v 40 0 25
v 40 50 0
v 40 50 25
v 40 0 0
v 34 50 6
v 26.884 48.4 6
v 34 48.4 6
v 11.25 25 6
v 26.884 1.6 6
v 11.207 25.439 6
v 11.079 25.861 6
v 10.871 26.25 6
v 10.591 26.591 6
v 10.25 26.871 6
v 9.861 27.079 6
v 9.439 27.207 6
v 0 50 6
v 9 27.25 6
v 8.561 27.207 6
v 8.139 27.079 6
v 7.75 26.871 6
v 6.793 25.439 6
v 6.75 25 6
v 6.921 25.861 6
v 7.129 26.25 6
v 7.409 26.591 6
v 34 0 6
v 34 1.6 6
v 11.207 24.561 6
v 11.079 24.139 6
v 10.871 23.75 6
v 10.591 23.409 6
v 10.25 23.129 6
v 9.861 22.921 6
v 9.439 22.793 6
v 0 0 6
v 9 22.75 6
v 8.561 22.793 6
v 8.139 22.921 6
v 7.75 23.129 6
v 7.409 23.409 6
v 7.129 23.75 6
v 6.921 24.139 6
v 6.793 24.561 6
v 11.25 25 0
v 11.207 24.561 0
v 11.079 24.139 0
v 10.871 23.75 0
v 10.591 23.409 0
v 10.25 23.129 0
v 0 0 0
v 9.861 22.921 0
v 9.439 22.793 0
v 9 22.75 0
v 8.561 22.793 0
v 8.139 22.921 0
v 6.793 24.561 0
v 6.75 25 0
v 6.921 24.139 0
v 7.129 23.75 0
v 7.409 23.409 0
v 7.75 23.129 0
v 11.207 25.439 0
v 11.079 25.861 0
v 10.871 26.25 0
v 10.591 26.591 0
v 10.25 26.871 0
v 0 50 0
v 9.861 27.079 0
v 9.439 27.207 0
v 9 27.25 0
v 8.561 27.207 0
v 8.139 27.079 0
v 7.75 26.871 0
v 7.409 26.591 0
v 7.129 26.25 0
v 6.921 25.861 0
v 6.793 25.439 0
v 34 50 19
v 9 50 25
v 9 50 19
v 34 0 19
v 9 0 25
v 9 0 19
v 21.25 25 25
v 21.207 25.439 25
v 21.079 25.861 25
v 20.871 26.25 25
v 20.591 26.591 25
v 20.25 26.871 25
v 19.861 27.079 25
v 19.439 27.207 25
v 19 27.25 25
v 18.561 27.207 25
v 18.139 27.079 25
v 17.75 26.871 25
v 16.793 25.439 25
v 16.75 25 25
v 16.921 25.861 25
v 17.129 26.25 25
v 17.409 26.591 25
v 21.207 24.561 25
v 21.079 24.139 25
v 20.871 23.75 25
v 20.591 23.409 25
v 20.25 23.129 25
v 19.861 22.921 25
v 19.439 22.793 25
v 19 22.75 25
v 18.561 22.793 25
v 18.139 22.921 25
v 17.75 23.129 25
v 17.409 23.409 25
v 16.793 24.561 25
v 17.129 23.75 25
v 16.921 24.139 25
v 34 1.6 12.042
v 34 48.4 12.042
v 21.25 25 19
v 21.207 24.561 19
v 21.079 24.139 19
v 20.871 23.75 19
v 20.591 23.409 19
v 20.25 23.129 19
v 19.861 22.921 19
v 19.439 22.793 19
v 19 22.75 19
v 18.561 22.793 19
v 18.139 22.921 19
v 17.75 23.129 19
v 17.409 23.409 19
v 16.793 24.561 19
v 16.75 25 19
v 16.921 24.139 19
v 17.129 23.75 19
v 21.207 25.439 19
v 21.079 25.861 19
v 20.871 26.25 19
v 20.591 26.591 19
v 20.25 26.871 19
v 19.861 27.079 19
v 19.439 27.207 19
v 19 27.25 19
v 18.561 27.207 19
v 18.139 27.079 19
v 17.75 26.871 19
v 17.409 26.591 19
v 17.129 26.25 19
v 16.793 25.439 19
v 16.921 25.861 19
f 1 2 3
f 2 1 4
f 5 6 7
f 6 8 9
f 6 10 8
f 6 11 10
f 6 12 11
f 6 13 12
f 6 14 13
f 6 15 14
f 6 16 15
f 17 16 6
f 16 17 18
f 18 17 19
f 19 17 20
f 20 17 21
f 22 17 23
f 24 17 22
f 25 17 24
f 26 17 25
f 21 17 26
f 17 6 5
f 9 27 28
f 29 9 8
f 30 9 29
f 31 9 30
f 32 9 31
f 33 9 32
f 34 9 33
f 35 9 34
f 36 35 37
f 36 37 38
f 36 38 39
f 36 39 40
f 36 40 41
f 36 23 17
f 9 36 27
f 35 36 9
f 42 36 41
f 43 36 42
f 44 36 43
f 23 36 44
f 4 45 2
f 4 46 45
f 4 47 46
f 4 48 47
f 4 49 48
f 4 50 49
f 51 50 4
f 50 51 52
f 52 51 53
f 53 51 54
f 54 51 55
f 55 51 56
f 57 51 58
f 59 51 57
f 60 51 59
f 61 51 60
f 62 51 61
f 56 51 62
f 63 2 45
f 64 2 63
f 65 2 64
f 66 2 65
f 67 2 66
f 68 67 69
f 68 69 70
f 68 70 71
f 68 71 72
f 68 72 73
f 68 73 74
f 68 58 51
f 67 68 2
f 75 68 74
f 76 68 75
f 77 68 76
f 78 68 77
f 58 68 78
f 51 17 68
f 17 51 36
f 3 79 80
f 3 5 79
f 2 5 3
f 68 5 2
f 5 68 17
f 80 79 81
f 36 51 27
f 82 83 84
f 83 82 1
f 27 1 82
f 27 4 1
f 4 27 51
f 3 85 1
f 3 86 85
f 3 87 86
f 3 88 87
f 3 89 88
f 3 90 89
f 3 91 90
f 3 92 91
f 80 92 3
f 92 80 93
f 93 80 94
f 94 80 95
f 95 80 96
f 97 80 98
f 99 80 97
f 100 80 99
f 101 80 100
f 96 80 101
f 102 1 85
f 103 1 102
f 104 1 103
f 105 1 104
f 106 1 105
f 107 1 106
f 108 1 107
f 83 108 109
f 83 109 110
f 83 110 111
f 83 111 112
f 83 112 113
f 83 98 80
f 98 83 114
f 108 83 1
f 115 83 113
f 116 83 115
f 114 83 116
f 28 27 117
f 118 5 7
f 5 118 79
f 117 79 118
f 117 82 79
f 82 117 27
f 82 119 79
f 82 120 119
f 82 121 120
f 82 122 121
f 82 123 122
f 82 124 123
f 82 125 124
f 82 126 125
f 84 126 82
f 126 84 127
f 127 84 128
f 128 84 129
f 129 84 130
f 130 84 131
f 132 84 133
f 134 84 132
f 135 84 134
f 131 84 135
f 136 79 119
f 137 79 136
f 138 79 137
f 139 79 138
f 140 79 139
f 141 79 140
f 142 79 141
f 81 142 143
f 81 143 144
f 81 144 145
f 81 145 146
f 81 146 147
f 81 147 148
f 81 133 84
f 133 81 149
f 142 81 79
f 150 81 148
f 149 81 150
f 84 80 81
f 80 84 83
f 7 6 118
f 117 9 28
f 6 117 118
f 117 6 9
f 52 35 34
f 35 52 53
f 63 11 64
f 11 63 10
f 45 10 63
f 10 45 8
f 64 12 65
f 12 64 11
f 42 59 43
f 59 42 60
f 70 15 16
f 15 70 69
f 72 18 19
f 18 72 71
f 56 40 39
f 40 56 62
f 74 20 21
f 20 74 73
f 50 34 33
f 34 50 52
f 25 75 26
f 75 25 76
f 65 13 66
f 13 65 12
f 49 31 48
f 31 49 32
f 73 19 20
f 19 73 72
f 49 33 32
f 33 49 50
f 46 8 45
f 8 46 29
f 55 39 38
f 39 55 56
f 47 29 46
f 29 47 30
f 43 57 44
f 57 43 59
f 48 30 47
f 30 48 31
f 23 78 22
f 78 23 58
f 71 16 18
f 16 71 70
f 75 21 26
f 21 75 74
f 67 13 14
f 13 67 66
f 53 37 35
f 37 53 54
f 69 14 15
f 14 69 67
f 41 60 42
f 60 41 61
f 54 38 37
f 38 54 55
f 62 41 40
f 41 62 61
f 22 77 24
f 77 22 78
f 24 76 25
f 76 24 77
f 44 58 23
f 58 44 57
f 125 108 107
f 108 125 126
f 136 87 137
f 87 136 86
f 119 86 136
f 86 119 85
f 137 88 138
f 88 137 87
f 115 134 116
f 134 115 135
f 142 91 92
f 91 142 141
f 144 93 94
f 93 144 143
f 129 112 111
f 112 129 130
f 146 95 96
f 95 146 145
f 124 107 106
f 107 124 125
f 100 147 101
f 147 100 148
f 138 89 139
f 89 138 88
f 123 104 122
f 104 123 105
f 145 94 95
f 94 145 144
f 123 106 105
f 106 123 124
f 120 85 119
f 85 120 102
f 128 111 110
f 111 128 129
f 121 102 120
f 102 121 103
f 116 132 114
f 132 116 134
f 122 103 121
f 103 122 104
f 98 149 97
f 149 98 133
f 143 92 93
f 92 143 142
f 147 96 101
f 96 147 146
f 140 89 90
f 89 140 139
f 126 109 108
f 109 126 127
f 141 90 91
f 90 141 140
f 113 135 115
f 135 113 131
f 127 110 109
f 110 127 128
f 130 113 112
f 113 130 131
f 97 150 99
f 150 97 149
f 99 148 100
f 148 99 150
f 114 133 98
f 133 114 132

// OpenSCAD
$fn = 32;

// ----------------------------------------------------------------------
// Z-bracket: 40 x 50 x 25 mm
// ----------------------------------------------------------------------

// --- parameters (mm) ---
bottom_run = 40;          // lower foot length, X
top_run = 25;             // upper foot length, X
profile_w = 50;           // bracket width, Y
height = 25;              // overall rise, Z
mat_t = 6;                // plate thickness
hole_d = 4.5;             // clearance for M4
rib_len = 9;              // gusset leg
rib_sink = 1.6;           // gusset overlap into the plates

module hole_z(px, py, z0) {
  translate([px, py, z0 - 2.5]) cylinder(h = mat_t + 5, d = hole_d);
}
module hole_x(py, pz) {
  translate([-2.5, py, pz]) rotate([0, 90, 0]) cylinder(h = mat_t + 5, d = hole_d);
}
module gusset(x0) {
  translate([x0, profile_w - rib_sink, 0])
    rotate([90, 0, 0])
      linear_extrude(height = profile_w - 2 * rib_sink)
        polygon(points = [[rib_sink, mat_t - rib_sink],
                          [rib_sink, mat_t - rib_sink + rib_len],
                          [-rib_len, mat_t - rib_sink]]);
}

difference() {
  union() {
    cube([bottom_run, profile_w, mat_t]);
    /* web, overlapping the lower foot */
    translate([bottom_run - mat_t, 0, 0]) cube([mat_t, profile_w, height]);
    /* upper foot, sunk into the web */
    translate([bottom_run - mat_t - top_run, 0, height - mat_t]) cube([top_run + mat_t, profile_w, mat_t]);
    gusset(bottom_run - mat_t);
  }
  hole_z(9, 25, 0);
  translate([bottom_run - mat_t - 15, 0, 0]) hole_z(0, 25, height - mat_t);
}
